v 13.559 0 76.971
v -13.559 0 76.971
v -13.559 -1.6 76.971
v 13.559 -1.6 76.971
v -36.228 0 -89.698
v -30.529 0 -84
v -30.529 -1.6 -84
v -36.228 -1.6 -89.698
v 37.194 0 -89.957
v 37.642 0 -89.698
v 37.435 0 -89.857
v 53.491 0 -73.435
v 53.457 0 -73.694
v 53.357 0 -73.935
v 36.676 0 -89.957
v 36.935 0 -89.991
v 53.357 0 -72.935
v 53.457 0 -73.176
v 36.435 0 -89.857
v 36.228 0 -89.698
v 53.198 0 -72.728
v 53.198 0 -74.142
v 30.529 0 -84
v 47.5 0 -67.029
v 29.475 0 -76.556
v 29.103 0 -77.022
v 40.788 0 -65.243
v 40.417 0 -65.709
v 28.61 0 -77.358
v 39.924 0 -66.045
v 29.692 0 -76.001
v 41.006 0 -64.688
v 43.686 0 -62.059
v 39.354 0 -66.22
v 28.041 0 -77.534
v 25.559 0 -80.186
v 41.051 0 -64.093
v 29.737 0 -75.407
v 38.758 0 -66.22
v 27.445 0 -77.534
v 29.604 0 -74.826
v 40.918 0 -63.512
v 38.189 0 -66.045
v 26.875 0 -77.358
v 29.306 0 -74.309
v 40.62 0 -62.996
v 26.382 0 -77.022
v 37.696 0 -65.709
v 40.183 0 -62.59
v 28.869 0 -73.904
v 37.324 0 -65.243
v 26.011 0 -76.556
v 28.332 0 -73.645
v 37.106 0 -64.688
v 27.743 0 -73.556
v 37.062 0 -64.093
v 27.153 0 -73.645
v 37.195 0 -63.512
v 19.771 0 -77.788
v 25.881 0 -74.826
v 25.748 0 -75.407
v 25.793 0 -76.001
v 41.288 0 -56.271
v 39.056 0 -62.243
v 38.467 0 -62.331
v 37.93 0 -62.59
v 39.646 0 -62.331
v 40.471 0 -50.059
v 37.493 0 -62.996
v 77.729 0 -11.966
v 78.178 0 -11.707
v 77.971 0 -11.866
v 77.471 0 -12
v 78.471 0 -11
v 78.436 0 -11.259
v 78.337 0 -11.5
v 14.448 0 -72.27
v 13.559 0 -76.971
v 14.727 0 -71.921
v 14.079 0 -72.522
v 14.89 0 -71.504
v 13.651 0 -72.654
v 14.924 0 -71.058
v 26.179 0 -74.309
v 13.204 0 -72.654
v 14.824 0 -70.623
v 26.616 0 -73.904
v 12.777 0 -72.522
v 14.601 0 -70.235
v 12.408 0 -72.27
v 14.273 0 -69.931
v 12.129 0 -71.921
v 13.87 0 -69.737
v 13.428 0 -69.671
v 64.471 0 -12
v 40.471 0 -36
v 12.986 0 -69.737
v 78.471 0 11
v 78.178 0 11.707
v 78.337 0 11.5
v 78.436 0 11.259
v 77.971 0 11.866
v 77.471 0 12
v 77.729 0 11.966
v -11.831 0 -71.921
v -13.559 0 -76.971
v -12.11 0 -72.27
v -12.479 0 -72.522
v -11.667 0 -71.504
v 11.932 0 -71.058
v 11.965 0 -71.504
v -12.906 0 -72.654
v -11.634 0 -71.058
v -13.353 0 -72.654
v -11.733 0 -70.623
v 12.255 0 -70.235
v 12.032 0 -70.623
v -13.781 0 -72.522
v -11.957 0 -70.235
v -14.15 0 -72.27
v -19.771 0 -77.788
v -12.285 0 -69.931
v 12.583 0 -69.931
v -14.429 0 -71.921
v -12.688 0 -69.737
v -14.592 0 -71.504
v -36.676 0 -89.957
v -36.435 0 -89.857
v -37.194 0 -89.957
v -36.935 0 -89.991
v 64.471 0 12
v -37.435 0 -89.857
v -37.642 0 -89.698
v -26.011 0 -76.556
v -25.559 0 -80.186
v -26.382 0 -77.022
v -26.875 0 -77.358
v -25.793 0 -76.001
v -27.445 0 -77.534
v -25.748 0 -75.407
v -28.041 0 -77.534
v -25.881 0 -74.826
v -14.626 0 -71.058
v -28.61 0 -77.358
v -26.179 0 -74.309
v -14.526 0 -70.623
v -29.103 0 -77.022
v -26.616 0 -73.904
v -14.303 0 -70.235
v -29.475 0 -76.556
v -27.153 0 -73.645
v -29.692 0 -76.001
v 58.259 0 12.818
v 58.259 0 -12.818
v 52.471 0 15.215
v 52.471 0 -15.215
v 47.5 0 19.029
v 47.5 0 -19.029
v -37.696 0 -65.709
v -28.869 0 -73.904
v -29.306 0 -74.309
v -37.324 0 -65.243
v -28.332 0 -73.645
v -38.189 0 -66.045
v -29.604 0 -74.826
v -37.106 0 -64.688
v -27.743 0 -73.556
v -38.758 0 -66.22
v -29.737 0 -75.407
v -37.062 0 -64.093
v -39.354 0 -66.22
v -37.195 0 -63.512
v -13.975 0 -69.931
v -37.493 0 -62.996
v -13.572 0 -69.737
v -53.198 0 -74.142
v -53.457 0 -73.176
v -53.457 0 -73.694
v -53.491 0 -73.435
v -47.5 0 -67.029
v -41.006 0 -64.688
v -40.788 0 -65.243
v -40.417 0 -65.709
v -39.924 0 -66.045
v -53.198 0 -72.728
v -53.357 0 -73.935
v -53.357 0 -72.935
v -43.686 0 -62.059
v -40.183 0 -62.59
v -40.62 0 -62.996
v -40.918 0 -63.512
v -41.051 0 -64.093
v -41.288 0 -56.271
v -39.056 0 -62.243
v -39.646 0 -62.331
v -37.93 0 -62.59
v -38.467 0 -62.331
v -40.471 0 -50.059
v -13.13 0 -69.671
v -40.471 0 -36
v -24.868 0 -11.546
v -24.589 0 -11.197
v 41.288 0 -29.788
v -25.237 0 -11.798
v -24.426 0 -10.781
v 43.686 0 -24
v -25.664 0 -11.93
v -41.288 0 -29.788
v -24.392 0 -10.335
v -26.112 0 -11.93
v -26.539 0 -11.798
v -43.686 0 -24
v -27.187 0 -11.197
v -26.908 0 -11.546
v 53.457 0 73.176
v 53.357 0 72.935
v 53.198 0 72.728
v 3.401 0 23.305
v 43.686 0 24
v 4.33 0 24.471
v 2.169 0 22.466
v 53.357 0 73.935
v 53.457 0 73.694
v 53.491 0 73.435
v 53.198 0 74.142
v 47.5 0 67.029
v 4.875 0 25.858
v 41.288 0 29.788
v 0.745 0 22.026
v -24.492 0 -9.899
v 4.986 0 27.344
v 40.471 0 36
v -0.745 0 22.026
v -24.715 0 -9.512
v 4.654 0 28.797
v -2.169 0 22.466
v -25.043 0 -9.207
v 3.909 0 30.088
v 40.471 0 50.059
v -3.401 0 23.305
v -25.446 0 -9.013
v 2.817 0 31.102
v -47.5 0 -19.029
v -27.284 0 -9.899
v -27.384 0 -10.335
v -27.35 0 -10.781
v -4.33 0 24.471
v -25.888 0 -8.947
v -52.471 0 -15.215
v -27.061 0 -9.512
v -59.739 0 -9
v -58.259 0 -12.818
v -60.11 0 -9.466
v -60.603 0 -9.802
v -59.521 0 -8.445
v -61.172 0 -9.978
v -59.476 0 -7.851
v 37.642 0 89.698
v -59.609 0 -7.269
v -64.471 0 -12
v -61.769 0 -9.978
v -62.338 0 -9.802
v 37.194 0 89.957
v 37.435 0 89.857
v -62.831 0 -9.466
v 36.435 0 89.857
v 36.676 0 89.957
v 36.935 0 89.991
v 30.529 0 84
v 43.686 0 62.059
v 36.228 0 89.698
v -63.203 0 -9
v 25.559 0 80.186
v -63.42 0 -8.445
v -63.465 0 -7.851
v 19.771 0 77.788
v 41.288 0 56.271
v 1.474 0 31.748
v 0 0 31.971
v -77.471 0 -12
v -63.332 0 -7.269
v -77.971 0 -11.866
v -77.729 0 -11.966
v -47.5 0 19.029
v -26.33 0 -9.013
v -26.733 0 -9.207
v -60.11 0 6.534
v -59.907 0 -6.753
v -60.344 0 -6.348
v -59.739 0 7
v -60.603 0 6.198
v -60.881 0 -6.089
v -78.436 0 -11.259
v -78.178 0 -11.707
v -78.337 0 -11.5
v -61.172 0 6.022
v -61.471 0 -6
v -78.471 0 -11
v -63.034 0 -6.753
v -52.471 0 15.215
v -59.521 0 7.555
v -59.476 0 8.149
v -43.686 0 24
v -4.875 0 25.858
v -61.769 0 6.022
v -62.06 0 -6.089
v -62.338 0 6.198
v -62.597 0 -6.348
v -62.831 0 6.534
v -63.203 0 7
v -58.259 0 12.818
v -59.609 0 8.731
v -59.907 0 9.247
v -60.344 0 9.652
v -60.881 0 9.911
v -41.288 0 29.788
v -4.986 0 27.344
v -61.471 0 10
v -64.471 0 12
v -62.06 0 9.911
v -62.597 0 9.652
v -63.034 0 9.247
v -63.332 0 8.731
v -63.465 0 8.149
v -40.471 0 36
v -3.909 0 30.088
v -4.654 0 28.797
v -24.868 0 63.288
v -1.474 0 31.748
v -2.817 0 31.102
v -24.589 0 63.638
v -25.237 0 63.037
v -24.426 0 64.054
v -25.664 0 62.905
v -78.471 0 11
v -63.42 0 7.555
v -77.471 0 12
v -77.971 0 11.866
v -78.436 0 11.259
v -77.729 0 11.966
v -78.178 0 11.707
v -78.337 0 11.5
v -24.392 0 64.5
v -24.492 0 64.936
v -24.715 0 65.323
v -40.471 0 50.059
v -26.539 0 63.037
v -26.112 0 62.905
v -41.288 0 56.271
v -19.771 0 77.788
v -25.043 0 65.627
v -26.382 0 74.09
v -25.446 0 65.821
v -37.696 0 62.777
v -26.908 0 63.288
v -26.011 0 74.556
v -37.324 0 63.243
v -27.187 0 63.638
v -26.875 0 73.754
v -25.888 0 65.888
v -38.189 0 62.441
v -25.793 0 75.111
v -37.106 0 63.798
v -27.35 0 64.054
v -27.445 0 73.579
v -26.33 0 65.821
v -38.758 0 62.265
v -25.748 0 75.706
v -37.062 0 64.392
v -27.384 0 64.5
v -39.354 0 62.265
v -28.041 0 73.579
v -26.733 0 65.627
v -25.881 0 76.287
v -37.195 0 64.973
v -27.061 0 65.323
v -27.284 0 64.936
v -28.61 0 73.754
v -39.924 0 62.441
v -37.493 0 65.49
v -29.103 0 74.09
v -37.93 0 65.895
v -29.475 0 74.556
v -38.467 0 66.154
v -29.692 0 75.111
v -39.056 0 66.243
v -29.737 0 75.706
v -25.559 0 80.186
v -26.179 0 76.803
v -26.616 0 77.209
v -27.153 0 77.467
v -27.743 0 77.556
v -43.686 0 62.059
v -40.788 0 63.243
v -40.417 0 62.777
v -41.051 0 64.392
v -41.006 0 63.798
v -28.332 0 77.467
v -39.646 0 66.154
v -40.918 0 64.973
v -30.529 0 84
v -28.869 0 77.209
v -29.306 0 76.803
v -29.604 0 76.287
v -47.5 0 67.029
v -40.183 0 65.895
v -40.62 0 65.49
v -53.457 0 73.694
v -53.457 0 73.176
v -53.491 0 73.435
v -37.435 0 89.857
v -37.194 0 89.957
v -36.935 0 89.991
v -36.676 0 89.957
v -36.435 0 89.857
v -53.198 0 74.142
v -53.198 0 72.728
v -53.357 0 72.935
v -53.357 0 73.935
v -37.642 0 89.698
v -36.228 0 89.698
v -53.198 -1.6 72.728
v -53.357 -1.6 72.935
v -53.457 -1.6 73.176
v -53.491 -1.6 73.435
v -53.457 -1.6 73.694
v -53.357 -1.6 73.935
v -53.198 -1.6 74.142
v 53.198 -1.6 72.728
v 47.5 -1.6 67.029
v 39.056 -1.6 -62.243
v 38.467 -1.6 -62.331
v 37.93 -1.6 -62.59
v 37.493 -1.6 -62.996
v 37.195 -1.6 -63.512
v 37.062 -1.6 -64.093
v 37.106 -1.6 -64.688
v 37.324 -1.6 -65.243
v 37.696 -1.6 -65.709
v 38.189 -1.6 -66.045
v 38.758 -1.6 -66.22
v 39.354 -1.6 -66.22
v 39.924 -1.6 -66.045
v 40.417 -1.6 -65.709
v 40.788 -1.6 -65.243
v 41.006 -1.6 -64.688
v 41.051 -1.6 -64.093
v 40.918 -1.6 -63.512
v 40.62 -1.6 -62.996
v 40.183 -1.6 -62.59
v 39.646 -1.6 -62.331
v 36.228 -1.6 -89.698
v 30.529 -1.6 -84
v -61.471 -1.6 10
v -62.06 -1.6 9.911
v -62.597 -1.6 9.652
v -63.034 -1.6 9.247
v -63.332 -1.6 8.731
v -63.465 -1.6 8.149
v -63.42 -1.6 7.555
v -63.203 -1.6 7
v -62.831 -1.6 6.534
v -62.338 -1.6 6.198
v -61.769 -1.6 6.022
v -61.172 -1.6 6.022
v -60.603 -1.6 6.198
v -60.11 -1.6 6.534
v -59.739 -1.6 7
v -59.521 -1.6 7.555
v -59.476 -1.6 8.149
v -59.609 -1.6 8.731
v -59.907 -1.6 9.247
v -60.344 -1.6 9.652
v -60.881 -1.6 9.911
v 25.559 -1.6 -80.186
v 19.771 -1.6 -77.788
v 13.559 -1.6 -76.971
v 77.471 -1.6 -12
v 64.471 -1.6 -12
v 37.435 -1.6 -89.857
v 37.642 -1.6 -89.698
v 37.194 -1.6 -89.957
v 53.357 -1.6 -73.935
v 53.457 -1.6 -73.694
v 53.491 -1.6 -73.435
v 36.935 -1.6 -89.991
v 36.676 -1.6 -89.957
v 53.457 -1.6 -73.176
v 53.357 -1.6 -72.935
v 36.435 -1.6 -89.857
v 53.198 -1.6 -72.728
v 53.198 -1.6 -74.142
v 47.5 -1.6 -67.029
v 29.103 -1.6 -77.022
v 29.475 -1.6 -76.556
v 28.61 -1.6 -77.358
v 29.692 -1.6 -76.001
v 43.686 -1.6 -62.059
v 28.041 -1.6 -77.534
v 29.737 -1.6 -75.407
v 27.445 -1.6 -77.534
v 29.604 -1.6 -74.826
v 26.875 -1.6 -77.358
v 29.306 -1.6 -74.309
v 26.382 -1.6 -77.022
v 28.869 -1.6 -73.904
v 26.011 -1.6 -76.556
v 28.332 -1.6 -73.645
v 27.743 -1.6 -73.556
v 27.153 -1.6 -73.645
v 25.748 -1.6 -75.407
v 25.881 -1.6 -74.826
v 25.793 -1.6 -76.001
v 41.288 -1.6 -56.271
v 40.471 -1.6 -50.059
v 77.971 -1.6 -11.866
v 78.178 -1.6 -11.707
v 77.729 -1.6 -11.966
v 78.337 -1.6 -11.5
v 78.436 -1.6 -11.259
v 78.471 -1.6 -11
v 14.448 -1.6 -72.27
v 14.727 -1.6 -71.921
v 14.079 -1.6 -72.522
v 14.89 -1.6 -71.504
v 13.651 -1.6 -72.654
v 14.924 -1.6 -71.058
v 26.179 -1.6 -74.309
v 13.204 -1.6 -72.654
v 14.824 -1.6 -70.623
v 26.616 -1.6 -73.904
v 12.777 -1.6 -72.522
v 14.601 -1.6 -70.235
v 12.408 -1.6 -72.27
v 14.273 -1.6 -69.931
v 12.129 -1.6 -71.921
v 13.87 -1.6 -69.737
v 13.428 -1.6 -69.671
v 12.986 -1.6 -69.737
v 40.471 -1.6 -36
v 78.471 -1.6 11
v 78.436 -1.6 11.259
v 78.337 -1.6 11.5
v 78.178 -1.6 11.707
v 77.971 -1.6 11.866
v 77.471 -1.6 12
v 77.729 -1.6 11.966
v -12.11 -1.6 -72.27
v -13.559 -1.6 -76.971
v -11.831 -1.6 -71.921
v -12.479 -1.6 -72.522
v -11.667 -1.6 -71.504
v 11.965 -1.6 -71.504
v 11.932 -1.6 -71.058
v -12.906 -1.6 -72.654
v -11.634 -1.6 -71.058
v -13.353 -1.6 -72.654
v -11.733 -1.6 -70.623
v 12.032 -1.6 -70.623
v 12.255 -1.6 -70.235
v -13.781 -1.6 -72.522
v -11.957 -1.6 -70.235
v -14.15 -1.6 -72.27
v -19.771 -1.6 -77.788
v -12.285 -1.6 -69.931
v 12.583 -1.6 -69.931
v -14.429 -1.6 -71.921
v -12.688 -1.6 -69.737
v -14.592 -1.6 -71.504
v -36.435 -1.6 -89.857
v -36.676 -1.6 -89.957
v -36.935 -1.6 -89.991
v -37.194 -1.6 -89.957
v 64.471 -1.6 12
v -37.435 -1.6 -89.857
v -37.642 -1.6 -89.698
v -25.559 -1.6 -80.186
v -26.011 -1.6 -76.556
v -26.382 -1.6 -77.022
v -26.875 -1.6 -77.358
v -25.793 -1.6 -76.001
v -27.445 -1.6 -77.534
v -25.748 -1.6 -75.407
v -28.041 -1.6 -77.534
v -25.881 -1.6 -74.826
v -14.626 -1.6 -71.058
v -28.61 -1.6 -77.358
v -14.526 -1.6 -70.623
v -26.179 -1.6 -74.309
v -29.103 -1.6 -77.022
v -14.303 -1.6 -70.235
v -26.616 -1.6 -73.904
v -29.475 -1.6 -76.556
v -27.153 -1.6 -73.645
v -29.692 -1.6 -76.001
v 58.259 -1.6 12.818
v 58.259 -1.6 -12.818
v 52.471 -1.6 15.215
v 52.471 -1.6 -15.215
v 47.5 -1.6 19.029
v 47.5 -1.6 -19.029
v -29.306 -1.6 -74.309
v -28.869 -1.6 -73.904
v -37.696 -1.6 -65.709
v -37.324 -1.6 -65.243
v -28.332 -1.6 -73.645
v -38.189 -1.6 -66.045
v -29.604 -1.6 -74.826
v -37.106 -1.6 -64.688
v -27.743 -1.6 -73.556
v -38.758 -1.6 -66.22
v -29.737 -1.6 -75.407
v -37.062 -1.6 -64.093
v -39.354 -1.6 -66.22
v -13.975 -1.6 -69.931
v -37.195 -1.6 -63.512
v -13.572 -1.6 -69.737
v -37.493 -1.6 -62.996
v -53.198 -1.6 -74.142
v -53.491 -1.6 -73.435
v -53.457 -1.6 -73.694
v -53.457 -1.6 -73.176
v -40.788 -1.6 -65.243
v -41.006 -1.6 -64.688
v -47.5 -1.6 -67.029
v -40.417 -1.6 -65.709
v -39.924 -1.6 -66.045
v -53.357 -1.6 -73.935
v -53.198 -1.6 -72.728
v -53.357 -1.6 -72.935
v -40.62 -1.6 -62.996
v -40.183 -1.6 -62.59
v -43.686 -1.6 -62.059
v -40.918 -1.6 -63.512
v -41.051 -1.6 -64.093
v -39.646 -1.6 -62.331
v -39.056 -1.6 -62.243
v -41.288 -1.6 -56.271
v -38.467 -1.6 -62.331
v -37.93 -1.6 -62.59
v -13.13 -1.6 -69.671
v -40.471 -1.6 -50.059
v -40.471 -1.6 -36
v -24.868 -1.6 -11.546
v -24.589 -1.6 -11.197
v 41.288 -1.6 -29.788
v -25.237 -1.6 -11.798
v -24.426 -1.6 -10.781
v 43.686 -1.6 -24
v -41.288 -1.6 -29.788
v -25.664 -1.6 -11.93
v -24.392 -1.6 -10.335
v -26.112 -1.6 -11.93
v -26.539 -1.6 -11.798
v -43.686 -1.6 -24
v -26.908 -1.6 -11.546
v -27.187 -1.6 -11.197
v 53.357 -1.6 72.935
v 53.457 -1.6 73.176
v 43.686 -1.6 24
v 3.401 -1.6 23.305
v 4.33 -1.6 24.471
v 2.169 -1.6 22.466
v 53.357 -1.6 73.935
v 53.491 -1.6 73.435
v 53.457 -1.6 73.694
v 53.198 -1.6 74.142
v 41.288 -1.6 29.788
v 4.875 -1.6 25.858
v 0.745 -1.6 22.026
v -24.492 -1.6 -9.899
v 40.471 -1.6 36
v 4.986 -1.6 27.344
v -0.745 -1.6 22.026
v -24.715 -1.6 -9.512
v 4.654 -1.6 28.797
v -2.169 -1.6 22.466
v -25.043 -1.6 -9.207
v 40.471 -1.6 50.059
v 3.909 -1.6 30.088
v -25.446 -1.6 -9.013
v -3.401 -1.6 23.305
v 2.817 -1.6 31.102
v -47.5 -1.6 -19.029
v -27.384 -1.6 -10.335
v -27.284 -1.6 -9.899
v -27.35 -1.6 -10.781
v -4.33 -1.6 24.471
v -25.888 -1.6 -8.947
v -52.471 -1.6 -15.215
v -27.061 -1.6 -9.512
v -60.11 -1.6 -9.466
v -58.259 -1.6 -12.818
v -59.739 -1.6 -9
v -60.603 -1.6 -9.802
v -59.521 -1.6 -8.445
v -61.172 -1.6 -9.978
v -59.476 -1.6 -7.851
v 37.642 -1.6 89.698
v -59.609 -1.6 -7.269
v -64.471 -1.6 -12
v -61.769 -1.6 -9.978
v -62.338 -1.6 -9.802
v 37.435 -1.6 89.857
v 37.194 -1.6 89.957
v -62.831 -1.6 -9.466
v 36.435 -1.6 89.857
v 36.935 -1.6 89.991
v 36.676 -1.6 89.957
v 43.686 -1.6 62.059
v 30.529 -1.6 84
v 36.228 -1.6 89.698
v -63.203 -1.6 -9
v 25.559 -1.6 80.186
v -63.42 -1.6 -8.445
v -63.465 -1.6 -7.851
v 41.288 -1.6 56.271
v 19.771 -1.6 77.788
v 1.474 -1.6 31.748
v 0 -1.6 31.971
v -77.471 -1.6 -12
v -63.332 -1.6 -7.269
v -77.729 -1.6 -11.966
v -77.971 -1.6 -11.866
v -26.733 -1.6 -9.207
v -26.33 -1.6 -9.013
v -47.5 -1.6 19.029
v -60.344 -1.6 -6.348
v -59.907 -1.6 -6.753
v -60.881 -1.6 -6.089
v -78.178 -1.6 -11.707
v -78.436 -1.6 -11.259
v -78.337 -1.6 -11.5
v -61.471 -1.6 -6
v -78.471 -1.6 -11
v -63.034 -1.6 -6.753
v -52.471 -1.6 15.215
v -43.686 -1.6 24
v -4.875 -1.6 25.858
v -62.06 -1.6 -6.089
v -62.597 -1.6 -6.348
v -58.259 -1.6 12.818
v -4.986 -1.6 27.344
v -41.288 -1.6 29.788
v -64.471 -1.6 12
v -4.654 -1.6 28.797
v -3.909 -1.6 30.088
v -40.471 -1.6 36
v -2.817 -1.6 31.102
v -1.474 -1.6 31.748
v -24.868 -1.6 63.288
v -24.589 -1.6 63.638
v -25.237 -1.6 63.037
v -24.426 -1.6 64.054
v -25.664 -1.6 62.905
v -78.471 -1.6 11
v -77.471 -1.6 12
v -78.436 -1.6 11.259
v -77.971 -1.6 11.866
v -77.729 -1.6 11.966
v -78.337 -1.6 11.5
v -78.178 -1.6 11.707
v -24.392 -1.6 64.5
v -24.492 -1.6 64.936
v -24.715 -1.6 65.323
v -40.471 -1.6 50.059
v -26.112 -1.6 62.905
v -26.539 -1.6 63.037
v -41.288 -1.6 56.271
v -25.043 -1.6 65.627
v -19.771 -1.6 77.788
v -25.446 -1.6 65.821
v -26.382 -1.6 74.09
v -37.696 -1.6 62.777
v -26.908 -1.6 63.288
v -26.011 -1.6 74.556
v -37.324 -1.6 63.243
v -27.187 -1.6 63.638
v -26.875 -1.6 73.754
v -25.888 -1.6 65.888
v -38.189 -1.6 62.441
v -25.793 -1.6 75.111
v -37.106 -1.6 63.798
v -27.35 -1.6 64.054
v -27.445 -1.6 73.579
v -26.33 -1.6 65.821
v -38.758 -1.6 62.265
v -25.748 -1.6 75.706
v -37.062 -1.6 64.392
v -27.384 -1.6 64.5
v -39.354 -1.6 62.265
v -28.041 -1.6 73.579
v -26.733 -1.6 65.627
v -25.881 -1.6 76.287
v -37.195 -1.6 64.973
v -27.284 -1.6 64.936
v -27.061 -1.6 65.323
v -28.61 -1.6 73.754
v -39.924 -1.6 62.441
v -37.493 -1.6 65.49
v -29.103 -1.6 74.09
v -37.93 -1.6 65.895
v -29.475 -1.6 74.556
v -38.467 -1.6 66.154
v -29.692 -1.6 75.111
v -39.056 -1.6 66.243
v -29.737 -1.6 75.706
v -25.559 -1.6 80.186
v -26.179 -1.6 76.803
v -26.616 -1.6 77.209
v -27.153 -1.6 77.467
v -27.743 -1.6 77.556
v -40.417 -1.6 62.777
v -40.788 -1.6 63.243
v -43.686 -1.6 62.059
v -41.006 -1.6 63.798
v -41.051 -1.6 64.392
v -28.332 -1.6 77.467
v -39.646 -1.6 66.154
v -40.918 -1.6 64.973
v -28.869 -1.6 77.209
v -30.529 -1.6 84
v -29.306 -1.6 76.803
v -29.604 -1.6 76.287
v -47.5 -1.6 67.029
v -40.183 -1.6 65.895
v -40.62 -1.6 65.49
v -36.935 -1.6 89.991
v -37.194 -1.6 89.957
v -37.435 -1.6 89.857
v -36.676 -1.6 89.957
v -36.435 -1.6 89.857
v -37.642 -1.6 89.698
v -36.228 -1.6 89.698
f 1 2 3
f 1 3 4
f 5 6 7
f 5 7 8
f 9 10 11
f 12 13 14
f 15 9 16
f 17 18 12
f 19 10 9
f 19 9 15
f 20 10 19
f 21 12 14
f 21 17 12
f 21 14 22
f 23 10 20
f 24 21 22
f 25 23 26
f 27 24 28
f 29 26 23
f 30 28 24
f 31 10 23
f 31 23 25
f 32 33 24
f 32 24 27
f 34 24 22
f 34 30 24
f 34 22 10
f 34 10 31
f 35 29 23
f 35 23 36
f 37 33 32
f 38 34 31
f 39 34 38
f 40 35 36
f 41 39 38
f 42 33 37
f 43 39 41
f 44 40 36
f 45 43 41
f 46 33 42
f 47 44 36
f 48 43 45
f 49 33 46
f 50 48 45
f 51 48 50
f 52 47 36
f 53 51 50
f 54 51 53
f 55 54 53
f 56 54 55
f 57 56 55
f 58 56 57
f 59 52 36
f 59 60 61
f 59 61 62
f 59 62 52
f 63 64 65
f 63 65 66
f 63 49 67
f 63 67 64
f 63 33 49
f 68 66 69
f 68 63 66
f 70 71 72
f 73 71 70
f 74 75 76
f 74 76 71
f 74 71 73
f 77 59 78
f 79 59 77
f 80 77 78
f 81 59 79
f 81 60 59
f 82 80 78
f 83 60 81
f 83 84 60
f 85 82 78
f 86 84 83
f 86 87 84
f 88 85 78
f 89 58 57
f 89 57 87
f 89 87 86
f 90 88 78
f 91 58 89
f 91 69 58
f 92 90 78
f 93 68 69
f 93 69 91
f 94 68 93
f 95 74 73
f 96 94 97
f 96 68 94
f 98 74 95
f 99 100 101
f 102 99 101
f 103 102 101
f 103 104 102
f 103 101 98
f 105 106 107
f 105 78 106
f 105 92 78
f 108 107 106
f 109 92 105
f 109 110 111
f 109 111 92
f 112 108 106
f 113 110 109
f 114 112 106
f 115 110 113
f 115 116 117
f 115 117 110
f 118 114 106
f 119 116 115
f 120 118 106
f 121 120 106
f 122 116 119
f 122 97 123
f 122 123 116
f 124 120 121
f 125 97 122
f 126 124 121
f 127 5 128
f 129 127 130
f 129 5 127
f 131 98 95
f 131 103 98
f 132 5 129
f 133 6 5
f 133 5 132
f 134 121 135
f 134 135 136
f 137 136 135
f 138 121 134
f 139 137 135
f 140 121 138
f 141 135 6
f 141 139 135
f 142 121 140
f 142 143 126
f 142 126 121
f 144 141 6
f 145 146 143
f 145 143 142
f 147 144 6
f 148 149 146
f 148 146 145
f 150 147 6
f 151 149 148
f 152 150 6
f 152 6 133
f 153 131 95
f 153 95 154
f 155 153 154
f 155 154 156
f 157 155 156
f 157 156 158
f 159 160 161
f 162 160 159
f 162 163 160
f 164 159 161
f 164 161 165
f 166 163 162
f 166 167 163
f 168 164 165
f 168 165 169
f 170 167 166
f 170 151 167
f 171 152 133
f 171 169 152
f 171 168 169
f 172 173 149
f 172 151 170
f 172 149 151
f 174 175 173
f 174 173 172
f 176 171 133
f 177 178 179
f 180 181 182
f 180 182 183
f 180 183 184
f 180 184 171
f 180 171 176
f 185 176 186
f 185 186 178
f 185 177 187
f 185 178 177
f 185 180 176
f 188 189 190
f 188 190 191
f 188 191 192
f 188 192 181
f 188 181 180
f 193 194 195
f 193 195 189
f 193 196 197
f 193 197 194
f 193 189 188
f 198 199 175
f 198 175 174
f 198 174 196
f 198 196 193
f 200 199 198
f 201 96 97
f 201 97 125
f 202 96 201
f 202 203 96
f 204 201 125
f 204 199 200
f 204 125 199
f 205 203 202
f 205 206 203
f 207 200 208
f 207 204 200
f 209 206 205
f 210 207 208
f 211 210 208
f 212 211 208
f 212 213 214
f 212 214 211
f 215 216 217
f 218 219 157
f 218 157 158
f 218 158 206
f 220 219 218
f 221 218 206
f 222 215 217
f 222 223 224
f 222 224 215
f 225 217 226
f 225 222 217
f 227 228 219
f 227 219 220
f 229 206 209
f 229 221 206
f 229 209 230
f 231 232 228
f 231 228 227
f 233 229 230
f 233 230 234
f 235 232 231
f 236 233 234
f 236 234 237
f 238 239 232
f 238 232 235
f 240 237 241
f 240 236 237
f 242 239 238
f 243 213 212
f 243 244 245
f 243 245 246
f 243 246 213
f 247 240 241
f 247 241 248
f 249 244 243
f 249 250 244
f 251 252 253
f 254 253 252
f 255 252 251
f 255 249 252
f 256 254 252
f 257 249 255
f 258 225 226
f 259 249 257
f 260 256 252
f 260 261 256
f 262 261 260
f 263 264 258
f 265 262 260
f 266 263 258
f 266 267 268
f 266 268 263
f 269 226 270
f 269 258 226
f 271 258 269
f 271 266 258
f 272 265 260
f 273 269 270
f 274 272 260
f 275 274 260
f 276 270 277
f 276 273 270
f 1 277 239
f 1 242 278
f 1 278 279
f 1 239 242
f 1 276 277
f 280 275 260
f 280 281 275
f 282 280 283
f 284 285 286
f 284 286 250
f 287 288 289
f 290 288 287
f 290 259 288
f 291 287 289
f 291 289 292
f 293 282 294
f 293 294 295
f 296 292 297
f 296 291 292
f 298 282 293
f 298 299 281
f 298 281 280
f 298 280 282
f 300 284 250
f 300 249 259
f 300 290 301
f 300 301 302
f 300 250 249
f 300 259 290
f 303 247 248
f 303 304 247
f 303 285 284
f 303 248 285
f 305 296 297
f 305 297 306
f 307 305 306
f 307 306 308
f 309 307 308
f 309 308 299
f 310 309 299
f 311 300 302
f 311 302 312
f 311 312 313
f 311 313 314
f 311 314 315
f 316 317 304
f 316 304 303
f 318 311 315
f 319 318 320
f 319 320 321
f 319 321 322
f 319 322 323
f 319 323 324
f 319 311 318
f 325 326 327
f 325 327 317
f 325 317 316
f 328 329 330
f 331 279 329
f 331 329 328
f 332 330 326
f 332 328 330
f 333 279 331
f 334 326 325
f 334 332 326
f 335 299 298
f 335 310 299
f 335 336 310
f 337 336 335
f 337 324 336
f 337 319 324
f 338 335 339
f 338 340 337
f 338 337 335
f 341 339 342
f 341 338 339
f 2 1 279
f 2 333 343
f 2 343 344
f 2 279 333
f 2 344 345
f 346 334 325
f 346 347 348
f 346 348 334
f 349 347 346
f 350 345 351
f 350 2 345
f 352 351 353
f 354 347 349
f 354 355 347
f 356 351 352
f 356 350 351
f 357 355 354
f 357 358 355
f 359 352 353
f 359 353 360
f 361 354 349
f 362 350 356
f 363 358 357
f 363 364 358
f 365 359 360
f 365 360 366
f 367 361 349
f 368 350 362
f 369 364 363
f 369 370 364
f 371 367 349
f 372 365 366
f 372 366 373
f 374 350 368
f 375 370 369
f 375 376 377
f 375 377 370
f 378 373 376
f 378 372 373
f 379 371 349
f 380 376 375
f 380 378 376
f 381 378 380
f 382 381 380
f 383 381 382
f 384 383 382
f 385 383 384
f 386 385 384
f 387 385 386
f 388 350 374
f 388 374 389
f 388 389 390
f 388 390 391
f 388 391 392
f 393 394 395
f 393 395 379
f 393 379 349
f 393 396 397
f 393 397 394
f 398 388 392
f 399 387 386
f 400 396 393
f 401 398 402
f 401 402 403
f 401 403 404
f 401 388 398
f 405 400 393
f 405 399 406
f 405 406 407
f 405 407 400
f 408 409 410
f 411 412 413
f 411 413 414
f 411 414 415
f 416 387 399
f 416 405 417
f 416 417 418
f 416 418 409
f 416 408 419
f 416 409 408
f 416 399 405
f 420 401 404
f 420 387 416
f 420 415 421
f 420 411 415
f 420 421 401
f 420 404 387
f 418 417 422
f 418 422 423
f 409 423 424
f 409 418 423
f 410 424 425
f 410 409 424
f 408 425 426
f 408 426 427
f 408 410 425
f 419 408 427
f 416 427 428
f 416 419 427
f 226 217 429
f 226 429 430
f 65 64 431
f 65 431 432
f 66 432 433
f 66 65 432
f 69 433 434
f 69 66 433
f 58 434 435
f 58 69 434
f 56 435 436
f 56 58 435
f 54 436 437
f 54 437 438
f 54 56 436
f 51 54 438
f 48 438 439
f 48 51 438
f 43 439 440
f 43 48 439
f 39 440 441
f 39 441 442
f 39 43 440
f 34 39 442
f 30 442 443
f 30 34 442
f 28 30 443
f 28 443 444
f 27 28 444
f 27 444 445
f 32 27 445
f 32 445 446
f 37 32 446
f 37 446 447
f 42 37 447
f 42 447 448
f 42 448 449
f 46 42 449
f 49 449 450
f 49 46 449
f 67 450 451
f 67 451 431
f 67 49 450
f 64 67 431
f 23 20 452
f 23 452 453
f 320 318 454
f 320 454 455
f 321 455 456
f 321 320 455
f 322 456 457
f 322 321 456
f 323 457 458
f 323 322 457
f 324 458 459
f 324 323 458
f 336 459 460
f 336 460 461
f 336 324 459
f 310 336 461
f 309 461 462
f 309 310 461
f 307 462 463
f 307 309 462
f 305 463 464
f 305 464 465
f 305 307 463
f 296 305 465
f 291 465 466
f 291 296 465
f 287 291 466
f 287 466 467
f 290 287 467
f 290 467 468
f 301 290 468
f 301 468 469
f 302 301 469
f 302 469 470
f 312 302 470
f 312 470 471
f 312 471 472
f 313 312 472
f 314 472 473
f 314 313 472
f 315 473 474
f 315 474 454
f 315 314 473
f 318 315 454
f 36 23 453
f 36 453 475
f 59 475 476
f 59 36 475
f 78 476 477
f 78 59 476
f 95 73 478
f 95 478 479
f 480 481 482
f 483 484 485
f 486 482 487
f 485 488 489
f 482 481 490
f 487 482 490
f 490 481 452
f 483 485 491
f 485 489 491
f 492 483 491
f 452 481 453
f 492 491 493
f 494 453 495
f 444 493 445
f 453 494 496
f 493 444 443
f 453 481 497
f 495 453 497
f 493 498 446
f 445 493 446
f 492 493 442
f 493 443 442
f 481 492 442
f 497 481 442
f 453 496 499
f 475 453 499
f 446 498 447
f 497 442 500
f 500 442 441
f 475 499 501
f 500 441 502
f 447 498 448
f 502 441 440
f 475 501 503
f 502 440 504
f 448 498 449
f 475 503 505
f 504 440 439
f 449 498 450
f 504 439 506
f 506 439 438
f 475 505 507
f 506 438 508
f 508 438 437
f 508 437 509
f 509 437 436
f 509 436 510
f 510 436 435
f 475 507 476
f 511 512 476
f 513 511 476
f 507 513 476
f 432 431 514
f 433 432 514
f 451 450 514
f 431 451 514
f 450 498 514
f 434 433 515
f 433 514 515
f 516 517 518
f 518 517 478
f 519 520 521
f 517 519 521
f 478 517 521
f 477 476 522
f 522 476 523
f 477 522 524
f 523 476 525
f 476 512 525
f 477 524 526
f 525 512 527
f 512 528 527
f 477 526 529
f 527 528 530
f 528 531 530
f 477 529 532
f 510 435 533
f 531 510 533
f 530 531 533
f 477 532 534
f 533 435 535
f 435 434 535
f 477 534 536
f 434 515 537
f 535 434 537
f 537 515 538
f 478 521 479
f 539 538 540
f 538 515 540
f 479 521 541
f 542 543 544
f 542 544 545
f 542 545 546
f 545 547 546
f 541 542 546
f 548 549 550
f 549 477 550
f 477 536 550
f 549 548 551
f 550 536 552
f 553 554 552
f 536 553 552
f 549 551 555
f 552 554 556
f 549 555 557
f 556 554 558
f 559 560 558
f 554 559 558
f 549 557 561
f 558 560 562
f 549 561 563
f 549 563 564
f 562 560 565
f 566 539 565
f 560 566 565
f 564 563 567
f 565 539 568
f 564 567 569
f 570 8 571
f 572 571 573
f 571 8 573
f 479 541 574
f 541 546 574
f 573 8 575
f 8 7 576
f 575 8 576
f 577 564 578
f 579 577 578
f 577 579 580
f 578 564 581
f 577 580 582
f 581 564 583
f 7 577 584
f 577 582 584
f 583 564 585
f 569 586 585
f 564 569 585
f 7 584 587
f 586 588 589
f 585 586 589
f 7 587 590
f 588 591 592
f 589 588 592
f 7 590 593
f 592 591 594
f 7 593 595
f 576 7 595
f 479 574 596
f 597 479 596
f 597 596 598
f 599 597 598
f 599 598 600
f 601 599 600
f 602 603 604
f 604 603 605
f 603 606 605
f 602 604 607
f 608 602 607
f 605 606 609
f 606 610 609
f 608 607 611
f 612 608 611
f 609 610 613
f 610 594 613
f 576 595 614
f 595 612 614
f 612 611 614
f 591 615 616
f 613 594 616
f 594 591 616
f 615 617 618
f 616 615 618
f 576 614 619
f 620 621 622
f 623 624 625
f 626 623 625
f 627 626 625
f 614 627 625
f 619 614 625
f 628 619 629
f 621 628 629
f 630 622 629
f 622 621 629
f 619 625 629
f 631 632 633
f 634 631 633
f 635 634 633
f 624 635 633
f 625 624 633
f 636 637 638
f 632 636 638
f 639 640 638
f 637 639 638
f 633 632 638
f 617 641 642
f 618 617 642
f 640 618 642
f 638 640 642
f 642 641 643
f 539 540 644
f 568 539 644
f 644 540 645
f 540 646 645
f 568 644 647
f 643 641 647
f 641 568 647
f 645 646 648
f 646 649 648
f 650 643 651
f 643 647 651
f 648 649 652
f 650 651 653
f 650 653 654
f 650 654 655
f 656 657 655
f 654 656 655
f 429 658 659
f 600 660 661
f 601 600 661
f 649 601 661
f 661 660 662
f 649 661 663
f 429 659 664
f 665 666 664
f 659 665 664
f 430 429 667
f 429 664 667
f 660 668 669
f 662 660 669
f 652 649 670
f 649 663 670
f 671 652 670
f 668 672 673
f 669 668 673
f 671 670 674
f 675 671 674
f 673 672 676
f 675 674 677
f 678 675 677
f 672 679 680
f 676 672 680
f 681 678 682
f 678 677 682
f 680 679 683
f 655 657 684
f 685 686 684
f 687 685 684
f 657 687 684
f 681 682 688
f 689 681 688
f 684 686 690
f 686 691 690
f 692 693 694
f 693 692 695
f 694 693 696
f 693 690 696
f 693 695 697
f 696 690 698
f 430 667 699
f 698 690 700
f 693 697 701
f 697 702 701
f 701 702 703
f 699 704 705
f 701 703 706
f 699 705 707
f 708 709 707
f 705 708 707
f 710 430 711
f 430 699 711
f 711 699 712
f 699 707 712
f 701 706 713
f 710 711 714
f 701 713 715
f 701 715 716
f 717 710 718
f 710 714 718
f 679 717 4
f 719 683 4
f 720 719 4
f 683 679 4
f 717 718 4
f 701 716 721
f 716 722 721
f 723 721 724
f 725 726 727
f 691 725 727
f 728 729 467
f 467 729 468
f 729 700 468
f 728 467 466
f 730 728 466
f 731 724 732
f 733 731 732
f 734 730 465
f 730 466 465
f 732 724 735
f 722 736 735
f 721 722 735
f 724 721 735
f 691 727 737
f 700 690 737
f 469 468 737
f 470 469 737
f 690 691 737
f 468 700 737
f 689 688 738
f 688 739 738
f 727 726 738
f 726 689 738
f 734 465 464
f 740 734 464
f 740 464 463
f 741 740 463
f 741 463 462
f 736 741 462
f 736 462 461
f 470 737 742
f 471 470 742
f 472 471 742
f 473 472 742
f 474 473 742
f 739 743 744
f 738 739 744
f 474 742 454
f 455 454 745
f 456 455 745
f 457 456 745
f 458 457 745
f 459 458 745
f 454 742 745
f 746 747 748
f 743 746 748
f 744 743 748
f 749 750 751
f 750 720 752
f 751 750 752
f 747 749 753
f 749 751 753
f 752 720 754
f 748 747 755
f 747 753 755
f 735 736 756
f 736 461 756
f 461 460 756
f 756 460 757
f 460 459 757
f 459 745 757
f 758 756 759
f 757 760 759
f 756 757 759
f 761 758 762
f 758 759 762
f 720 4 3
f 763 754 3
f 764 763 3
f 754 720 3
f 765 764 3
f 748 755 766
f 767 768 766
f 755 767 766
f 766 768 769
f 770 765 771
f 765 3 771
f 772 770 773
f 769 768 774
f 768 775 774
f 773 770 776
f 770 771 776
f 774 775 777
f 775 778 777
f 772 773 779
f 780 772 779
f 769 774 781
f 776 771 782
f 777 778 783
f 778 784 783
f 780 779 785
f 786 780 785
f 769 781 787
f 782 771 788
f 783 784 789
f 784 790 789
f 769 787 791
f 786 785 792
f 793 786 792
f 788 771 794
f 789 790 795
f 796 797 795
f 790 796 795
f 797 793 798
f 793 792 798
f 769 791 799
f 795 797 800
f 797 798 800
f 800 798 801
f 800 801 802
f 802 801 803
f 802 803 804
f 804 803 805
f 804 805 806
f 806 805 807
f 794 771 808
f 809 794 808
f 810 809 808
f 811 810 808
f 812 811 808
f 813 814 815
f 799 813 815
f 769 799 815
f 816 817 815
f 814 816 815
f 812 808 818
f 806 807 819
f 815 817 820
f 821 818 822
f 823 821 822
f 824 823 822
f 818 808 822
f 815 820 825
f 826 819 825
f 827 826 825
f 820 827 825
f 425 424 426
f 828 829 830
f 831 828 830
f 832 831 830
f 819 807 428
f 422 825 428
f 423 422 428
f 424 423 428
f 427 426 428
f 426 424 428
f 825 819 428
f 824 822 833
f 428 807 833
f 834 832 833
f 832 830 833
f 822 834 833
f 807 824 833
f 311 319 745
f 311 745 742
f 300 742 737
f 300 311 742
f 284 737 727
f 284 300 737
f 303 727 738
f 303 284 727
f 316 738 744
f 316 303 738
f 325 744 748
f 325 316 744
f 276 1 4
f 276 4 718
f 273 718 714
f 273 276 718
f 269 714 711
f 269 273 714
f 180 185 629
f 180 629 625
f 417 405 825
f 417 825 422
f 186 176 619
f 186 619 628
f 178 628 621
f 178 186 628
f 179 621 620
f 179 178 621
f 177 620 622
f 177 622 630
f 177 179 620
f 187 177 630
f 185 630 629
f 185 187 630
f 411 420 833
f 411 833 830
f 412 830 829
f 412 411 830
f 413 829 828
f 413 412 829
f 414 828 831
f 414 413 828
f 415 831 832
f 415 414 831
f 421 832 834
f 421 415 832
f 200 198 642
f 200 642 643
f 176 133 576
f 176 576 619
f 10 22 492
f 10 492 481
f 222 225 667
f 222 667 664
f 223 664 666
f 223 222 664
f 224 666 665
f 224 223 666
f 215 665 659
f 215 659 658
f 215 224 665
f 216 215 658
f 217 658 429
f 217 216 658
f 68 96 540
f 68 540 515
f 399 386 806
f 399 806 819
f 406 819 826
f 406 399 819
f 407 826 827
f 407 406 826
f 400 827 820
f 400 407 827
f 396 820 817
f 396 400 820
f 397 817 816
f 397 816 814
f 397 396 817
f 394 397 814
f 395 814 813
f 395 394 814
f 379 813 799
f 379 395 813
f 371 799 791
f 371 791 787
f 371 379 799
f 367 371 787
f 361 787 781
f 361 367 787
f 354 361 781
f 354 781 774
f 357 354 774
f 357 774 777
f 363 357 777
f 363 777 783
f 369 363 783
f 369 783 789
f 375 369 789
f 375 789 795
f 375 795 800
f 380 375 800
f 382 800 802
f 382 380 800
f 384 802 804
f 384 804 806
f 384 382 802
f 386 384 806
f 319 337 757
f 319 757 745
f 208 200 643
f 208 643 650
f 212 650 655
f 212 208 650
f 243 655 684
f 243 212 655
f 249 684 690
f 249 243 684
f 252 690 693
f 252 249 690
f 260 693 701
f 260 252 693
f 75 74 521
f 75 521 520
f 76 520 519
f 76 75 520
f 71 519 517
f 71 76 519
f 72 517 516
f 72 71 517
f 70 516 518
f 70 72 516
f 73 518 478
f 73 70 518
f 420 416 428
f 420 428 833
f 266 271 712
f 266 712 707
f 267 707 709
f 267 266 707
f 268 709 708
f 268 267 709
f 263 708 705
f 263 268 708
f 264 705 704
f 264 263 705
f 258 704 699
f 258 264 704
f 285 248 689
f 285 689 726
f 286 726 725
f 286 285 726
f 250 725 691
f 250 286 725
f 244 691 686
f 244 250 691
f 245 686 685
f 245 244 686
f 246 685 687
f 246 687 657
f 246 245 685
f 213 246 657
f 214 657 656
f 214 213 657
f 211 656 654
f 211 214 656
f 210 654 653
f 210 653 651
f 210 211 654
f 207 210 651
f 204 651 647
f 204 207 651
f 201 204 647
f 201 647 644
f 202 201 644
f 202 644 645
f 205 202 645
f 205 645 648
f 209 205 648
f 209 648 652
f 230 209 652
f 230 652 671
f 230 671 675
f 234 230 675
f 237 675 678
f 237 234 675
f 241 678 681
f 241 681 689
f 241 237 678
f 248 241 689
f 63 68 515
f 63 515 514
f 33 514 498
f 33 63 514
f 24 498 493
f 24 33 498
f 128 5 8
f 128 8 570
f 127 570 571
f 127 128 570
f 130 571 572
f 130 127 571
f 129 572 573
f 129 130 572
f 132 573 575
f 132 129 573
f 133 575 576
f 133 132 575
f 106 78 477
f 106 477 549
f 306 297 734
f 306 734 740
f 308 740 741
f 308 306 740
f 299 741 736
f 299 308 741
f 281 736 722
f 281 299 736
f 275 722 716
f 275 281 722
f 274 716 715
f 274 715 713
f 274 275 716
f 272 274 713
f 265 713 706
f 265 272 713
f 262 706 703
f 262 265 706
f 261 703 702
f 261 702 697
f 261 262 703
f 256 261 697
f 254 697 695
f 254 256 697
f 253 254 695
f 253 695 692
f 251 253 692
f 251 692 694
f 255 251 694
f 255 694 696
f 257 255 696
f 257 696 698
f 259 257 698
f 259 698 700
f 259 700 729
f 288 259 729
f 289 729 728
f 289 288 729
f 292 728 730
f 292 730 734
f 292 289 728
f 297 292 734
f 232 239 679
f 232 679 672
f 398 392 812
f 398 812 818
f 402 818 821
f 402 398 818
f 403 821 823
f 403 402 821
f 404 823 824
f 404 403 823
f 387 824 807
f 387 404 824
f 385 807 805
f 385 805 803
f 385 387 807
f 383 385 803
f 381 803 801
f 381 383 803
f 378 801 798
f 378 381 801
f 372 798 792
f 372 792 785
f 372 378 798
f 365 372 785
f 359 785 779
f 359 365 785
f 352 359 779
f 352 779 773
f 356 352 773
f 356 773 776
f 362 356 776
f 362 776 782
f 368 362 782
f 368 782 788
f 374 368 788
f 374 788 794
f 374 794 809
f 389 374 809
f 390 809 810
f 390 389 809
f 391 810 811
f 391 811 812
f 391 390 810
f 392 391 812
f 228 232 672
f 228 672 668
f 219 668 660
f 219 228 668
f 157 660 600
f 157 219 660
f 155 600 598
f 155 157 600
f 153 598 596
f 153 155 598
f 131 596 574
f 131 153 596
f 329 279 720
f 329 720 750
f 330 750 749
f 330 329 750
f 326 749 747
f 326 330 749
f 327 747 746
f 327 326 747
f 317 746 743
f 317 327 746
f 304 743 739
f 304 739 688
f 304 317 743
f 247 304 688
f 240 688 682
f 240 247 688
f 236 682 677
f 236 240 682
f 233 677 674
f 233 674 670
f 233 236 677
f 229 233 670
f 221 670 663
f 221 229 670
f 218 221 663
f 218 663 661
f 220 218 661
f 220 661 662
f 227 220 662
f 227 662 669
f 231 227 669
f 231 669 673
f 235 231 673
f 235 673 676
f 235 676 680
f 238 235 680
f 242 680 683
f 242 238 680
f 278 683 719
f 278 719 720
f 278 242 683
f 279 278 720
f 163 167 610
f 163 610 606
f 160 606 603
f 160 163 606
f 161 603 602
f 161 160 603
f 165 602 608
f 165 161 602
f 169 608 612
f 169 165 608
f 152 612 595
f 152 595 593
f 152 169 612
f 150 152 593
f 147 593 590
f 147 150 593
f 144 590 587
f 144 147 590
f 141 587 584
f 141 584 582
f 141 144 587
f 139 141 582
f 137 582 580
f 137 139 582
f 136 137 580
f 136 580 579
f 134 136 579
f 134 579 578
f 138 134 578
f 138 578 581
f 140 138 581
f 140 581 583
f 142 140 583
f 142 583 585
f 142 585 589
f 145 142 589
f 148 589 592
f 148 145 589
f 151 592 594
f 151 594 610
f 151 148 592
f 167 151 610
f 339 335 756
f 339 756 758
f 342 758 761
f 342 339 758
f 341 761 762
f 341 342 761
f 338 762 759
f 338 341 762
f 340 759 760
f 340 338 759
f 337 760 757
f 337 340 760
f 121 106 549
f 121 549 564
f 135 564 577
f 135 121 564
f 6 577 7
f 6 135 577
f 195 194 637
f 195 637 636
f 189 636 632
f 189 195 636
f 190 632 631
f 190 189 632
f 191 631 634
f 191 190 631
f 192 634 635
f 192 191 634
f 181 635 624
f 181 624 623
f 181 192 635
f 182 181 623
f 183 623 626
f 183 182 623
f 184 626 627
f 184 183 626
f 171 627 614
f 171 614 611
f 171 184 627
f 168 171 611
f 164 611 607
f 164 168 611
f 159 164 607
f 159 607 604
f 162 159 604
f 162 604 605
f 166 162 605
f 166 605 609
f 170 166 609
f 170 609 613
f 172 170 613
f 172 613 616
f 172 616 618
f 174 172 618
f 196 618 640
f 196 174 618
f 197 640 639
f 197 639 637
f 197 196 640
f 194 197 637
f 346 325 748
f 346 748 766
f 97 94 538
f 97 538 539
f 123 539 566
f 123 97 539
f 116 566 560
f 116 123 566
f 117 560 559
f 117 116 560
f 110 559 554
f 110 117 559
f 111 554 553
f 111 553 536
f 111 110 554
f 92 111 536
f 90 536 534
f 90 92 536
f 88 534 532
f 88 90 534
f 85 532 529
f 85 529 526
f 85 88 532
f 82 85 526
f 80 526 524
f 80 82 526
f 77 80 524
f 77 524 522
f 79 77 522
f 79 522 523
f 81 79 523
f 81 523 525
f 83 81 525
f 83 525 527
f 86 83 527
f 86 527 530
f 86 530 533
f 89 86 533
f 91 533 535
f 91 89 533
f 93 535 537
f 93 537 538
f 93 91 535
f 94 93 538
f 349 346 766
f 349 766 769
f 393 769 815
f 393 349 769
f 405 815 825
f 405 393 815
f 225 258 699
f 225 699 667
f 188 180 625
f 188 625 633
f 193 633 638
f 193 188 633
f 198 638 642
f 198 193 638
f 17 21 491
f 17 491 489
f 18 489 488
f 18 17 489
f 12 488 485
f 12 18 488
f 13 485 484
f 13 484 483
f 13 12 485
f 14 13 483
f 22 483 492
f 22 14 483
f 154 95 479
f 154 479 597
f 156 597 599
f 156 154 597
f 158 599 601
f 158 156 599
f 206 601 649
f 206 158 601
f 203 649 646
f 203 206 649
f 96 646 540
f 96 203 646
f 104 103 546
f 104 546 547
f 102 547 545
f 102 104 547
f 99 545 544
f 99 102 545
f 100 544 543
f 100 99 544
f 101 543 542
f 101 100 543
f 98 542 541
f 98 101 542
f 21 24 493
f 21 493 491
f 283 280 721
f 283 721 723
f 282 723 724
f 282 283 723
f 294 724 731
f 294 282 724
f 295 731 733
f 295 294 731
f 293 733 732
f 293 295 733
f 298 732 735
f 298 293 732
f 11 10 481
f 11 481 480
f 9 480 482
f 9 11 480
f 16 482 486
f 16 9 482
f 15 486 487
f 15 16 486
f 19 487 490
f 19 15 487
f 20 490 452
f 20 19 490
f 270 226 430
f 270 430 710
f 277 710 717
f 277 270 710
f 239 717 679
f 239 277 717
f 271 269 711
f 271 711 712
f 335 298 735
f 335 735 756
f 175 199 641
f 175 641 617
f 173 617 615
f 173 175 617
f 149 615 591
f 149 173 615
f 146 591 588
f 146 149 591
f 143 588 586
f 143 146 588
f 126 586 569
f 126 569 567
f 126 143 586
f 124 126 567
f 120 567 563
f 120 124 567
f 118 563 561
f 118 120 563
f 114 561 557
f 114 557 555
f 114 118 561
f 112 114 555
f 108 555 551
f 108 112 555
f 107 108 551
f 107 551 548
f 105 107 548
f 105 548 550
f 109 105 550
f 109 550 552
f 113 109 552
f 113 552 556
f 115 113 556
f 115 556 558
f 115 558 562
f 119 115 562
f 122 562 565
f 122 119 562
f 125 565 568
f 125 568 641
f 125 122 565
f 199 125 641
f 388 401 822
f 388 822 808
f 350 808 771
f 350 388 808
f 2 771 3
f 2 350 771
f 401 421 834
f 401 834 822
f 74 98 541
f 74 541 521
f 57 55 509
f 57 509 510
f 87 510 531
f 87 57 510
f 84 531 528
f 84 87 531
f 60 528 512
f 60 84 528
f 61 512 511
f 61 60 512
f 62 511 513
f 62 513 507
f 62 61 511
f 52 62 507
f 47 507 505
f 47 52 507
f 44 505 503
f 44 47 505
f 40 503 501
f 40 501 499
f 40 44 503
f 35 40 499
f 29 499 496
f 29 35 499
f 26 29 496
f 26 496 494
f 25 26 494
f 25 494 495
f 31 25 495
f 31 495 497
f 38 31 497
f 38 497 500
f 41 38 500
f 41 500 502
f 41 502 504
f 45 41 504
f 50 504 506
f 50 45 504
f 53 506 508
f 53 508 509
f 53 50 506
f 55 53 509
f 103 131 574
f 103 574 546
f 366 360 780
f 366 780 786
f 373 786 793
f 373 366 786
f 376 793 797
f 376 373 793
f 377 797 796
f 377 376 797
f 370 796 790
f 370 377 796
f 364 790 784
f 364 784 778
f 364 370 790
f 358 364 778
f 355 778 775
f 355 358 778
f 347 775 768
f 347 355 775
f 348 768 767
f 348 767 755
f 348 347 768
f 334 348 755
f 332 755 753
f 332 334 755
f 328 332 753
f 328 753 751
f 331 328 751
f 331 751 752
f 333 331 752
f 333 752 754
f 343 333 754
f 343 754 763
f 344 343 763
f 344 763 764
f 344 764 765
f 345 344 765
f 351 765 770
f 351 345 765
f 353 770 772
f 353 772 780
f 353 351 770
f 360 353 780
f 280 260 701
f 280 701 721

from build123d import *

# Parameters (mm, degrees)
SKETCH_8_R      = 2
SKETCH_8_R_2    = 5
SKETCH_8_R_3    = 1.5
EXTRUDE_1_DEPTH = 1.6


with BuildPart() as part:
    # 草图8 → 凸台-拉伸1 (new body)
    with BuildSketch(Plane.XZ):
        with BuildLine():
            Line((30.529437252, 84), (36.227922061, 89.69848481))
            ThreePointArc((36.227922061, 89.69848481), (36.935028843, 89.991378029), (37.642135624, 89.69848481))
            Line((37.642135624, 89.69848481), (53.19848481, 74.142135624))
            ThreePointArc((53.19848481, 74.142135624), (53.491378029, 73.435028843), (53.19848481, 72.727922061))
            Line((53.19848481, 72.727922061), (47.5, 67.029437252))
            ThreePointArc((47.5, 67.029437252), (42.297453968, 59.24327688), (40.470562748, 50.058874503))
            Line((40.470562748, 50.058874503), (40.470562748, 36))
            ThreePointArc((40.470562748, 36), (47.5, 19.029437252), (64.470562748, 12))
            Line((64.470562748, 12), (77.470562748, 12))
            ThreePointArc((77.470562748, 12), (78.17766953, 11.707106781), (78.470562748, 11))
            Line((78.470562748, 11), (78.470562748, -11))
            ThreePointArc((78.470562748, -11), (78.17766953, -11.707106781), (77.470562748, -12))
            Line((77.470562748, -12), (64.470562748, -12))
            ThreePointArc((64.470562748, -12), (47.5, -19.029437252), (40.470562748, -36))
            Line((40.470562748, -36), (40.470562748, -50.058874503))
            ThreePointArc((40.470562748, -50.058874503), (42.297453968, -59.24327688), (47.5, -67.029437252))
            Line((47.5, -67.029437252), (53.19848481, -72.727922061))
            ThreePointArc((53.19848481, -72.727922061), (53.491378029, -73.435028843), (53.19848481, -74.142135624))
            Line((53.19848481, -74.142135624), (37.642135624, -89.69848481))
            ThreePointArc((37.642135624, -89.69848481), (36.935028843, -89.991378029), (36.227922061, -89.69848481))
            Line((36.227922061, -89.69848481), (30.529437252, -84))
            ThreePointArc((30.529437252, -84), (22.74327688, -78.797453968), (13.558874503, -76.970562748))
            Line((13.558874503, -76.970562748), (-13.558874503, -76.970562748))
            ThreePointArc((-13.558874503, -76.970562748), (-22.74327688, -78.797453968), (-30.529437252, -84))
            Line((-30.529437252, -84), (-36.227922061, -89.69848481))
            ThreePointArc((-36.227922061, -89.69848481), (-36.935028843, -89.991378029), (-37.642135624, -89.69848481))
            Line((-37.642135624, -89.69848481), (-53.19848481, -74.142135624))
            ThreePointArc((-53.19848481, -74.142135624), (-53.491378029, -73.435028843), (-53.19848481, -72.727922061))
            Line((-53.19848481, -72.727922061), (-47.5, -67.029437252))
            ThreePointArc((-47.5, -67.029437252), (-42.297453968, -59.24327688), (-40.470562748, -50.058874503))
            Line((-40.470562748, -50.058874503), (-40.470562748, -36))
            ThreePointArc((-40.470562748, -36), (-47.5, -19.029437252), (-64.470562748, -12))
            Line((-64.470562748, -12), (-77.470562748, -12))
            ThreePointArc((-77.470562748, -12), (-78.17766953, -11.707106781), (-78.470562748, -11))
            Line((-78.470562748, -11), (-78.470562748, 11))
            ThreePointArc((-78.470562748, 11), (-78.17766953, 11.707106781), (-77.470562748, 12))
            Line((-77.470562748, 12), (-64.470562748, 12))
            ThreePointArc((-64.470562748, 12), (-47.5, 19.029437252), (-40.470562748, 36))
            Line((-40.470562748, 36), (-40.470562748, 50.058874503))
            ThreePointArc((-40.470562748, 50.058874503), (-42.297453968, 59.24327688), (-47.5, 67.029437252))
            Line((-47.5, 67.029437252), (-53.19848481, 72.727922061))
            ThreePointArc((-53.19848481, 72.727922061), (-53.491378029, 73.435028843), (-53.19848481, 74.142135624))
            Line((-53.19848481, 74.142135624), (-37.642135624, 89.69848481))
            ThreePointArc((-37.642135624, 89.69848481), (-36.935028843, 89.991378029), (-36.227922061, 89.69848481))
            Line((-36.227922061, 89.69848481), (-30.529437252, 84))
            ThreePointArc((-30.529437252, 84), (-22.74327688, 78.797453968), (-13.558874503, 76.970562748))
            Line((-13.558874503, 76.970562748), (13.558874503, 76.970562748))
            ThreePointArc((13.558874503, 76.970562748), (22.74327688, 78.797453968), (30.529437252, 84))
        make_face()
        with Locations(Location((-39.056349186, 64.242640687, 0), (0, 0, 90))):
            Circle(SKETCH_8_R, mode=Mode.SUBTRACT)
        with Locations(Location((-27.742640687, 75.556349186, 0), (0, 0, 90))):
            Circle(SKETCH_8_R, mode=Mode.SUBTRACT)
        with Locations(Location((0, 26.970562748, 0), (0, 0, 90))):
            Circle(SKETCH_8_R_2, mode=Mode.SUBTRACT)
        with Locations(Location((-61.470562748, 8, 0), (0, 0, 90))):
            Circle(SKETCH_8_R, mode=Mode.SUBTRACT)
        with Locations(Location((-25.887975085, -10.446849588, 0), (0, 0, 90))):
            Circle(SKETCH_8_R_3, mode=Mode.SUBTRACT)
        with Locations(Location((-25.887975085, 64.387975085, 0), (0, 0, 90))):
            Circle(SKETCH_8_R_3, mode=Mode.SUBTRACT)
        with Locations(Location((27.742640687, -75.556349186, 0), (0, 0, 90))):
            Circle(SKETCH_8_R, mode=Mode.SUBTRACT)
        with Locations(Location((39.056349186, -64.242640687, 0), (0, 0, 90))):
            Circle(SKETCH_8_R, mode=Mode.SUBTRACT)
        with Locations(Location((-27.742640687, -75.556349186, 0), (0, 0, 90))):
            Circle(SKETCH_8_R, mode=Mode.SUBTRACT)
        with Locations(Location((-39.056349186, -64.242640687, 0), (0, 0, 90))):
            Circle(SKETCH_8_R, mode=Mode.SUBTRACT)
        with Locations(Location((13.427835179, -71.170562748, 0), (0, 0, 90))):
            Circle(SKETCH_8_R_3, mode=Mode.SUBTRACT)
        with Locations(Location((-13.1297961, -71.170562748, 0), (0, 0, 90))):
            Circle(SKETCH_8_R_3, mode=Mode.SUBTRACT)
        with Locations(Location((-61.470562748, -8, 0), (0, 0, 90))):
            Circle(SKETCH_8_R, mode=Mode.SUBTRACT)
    extrude(amount=EXTRUDE_1_DEPTH)


solid = part.part
